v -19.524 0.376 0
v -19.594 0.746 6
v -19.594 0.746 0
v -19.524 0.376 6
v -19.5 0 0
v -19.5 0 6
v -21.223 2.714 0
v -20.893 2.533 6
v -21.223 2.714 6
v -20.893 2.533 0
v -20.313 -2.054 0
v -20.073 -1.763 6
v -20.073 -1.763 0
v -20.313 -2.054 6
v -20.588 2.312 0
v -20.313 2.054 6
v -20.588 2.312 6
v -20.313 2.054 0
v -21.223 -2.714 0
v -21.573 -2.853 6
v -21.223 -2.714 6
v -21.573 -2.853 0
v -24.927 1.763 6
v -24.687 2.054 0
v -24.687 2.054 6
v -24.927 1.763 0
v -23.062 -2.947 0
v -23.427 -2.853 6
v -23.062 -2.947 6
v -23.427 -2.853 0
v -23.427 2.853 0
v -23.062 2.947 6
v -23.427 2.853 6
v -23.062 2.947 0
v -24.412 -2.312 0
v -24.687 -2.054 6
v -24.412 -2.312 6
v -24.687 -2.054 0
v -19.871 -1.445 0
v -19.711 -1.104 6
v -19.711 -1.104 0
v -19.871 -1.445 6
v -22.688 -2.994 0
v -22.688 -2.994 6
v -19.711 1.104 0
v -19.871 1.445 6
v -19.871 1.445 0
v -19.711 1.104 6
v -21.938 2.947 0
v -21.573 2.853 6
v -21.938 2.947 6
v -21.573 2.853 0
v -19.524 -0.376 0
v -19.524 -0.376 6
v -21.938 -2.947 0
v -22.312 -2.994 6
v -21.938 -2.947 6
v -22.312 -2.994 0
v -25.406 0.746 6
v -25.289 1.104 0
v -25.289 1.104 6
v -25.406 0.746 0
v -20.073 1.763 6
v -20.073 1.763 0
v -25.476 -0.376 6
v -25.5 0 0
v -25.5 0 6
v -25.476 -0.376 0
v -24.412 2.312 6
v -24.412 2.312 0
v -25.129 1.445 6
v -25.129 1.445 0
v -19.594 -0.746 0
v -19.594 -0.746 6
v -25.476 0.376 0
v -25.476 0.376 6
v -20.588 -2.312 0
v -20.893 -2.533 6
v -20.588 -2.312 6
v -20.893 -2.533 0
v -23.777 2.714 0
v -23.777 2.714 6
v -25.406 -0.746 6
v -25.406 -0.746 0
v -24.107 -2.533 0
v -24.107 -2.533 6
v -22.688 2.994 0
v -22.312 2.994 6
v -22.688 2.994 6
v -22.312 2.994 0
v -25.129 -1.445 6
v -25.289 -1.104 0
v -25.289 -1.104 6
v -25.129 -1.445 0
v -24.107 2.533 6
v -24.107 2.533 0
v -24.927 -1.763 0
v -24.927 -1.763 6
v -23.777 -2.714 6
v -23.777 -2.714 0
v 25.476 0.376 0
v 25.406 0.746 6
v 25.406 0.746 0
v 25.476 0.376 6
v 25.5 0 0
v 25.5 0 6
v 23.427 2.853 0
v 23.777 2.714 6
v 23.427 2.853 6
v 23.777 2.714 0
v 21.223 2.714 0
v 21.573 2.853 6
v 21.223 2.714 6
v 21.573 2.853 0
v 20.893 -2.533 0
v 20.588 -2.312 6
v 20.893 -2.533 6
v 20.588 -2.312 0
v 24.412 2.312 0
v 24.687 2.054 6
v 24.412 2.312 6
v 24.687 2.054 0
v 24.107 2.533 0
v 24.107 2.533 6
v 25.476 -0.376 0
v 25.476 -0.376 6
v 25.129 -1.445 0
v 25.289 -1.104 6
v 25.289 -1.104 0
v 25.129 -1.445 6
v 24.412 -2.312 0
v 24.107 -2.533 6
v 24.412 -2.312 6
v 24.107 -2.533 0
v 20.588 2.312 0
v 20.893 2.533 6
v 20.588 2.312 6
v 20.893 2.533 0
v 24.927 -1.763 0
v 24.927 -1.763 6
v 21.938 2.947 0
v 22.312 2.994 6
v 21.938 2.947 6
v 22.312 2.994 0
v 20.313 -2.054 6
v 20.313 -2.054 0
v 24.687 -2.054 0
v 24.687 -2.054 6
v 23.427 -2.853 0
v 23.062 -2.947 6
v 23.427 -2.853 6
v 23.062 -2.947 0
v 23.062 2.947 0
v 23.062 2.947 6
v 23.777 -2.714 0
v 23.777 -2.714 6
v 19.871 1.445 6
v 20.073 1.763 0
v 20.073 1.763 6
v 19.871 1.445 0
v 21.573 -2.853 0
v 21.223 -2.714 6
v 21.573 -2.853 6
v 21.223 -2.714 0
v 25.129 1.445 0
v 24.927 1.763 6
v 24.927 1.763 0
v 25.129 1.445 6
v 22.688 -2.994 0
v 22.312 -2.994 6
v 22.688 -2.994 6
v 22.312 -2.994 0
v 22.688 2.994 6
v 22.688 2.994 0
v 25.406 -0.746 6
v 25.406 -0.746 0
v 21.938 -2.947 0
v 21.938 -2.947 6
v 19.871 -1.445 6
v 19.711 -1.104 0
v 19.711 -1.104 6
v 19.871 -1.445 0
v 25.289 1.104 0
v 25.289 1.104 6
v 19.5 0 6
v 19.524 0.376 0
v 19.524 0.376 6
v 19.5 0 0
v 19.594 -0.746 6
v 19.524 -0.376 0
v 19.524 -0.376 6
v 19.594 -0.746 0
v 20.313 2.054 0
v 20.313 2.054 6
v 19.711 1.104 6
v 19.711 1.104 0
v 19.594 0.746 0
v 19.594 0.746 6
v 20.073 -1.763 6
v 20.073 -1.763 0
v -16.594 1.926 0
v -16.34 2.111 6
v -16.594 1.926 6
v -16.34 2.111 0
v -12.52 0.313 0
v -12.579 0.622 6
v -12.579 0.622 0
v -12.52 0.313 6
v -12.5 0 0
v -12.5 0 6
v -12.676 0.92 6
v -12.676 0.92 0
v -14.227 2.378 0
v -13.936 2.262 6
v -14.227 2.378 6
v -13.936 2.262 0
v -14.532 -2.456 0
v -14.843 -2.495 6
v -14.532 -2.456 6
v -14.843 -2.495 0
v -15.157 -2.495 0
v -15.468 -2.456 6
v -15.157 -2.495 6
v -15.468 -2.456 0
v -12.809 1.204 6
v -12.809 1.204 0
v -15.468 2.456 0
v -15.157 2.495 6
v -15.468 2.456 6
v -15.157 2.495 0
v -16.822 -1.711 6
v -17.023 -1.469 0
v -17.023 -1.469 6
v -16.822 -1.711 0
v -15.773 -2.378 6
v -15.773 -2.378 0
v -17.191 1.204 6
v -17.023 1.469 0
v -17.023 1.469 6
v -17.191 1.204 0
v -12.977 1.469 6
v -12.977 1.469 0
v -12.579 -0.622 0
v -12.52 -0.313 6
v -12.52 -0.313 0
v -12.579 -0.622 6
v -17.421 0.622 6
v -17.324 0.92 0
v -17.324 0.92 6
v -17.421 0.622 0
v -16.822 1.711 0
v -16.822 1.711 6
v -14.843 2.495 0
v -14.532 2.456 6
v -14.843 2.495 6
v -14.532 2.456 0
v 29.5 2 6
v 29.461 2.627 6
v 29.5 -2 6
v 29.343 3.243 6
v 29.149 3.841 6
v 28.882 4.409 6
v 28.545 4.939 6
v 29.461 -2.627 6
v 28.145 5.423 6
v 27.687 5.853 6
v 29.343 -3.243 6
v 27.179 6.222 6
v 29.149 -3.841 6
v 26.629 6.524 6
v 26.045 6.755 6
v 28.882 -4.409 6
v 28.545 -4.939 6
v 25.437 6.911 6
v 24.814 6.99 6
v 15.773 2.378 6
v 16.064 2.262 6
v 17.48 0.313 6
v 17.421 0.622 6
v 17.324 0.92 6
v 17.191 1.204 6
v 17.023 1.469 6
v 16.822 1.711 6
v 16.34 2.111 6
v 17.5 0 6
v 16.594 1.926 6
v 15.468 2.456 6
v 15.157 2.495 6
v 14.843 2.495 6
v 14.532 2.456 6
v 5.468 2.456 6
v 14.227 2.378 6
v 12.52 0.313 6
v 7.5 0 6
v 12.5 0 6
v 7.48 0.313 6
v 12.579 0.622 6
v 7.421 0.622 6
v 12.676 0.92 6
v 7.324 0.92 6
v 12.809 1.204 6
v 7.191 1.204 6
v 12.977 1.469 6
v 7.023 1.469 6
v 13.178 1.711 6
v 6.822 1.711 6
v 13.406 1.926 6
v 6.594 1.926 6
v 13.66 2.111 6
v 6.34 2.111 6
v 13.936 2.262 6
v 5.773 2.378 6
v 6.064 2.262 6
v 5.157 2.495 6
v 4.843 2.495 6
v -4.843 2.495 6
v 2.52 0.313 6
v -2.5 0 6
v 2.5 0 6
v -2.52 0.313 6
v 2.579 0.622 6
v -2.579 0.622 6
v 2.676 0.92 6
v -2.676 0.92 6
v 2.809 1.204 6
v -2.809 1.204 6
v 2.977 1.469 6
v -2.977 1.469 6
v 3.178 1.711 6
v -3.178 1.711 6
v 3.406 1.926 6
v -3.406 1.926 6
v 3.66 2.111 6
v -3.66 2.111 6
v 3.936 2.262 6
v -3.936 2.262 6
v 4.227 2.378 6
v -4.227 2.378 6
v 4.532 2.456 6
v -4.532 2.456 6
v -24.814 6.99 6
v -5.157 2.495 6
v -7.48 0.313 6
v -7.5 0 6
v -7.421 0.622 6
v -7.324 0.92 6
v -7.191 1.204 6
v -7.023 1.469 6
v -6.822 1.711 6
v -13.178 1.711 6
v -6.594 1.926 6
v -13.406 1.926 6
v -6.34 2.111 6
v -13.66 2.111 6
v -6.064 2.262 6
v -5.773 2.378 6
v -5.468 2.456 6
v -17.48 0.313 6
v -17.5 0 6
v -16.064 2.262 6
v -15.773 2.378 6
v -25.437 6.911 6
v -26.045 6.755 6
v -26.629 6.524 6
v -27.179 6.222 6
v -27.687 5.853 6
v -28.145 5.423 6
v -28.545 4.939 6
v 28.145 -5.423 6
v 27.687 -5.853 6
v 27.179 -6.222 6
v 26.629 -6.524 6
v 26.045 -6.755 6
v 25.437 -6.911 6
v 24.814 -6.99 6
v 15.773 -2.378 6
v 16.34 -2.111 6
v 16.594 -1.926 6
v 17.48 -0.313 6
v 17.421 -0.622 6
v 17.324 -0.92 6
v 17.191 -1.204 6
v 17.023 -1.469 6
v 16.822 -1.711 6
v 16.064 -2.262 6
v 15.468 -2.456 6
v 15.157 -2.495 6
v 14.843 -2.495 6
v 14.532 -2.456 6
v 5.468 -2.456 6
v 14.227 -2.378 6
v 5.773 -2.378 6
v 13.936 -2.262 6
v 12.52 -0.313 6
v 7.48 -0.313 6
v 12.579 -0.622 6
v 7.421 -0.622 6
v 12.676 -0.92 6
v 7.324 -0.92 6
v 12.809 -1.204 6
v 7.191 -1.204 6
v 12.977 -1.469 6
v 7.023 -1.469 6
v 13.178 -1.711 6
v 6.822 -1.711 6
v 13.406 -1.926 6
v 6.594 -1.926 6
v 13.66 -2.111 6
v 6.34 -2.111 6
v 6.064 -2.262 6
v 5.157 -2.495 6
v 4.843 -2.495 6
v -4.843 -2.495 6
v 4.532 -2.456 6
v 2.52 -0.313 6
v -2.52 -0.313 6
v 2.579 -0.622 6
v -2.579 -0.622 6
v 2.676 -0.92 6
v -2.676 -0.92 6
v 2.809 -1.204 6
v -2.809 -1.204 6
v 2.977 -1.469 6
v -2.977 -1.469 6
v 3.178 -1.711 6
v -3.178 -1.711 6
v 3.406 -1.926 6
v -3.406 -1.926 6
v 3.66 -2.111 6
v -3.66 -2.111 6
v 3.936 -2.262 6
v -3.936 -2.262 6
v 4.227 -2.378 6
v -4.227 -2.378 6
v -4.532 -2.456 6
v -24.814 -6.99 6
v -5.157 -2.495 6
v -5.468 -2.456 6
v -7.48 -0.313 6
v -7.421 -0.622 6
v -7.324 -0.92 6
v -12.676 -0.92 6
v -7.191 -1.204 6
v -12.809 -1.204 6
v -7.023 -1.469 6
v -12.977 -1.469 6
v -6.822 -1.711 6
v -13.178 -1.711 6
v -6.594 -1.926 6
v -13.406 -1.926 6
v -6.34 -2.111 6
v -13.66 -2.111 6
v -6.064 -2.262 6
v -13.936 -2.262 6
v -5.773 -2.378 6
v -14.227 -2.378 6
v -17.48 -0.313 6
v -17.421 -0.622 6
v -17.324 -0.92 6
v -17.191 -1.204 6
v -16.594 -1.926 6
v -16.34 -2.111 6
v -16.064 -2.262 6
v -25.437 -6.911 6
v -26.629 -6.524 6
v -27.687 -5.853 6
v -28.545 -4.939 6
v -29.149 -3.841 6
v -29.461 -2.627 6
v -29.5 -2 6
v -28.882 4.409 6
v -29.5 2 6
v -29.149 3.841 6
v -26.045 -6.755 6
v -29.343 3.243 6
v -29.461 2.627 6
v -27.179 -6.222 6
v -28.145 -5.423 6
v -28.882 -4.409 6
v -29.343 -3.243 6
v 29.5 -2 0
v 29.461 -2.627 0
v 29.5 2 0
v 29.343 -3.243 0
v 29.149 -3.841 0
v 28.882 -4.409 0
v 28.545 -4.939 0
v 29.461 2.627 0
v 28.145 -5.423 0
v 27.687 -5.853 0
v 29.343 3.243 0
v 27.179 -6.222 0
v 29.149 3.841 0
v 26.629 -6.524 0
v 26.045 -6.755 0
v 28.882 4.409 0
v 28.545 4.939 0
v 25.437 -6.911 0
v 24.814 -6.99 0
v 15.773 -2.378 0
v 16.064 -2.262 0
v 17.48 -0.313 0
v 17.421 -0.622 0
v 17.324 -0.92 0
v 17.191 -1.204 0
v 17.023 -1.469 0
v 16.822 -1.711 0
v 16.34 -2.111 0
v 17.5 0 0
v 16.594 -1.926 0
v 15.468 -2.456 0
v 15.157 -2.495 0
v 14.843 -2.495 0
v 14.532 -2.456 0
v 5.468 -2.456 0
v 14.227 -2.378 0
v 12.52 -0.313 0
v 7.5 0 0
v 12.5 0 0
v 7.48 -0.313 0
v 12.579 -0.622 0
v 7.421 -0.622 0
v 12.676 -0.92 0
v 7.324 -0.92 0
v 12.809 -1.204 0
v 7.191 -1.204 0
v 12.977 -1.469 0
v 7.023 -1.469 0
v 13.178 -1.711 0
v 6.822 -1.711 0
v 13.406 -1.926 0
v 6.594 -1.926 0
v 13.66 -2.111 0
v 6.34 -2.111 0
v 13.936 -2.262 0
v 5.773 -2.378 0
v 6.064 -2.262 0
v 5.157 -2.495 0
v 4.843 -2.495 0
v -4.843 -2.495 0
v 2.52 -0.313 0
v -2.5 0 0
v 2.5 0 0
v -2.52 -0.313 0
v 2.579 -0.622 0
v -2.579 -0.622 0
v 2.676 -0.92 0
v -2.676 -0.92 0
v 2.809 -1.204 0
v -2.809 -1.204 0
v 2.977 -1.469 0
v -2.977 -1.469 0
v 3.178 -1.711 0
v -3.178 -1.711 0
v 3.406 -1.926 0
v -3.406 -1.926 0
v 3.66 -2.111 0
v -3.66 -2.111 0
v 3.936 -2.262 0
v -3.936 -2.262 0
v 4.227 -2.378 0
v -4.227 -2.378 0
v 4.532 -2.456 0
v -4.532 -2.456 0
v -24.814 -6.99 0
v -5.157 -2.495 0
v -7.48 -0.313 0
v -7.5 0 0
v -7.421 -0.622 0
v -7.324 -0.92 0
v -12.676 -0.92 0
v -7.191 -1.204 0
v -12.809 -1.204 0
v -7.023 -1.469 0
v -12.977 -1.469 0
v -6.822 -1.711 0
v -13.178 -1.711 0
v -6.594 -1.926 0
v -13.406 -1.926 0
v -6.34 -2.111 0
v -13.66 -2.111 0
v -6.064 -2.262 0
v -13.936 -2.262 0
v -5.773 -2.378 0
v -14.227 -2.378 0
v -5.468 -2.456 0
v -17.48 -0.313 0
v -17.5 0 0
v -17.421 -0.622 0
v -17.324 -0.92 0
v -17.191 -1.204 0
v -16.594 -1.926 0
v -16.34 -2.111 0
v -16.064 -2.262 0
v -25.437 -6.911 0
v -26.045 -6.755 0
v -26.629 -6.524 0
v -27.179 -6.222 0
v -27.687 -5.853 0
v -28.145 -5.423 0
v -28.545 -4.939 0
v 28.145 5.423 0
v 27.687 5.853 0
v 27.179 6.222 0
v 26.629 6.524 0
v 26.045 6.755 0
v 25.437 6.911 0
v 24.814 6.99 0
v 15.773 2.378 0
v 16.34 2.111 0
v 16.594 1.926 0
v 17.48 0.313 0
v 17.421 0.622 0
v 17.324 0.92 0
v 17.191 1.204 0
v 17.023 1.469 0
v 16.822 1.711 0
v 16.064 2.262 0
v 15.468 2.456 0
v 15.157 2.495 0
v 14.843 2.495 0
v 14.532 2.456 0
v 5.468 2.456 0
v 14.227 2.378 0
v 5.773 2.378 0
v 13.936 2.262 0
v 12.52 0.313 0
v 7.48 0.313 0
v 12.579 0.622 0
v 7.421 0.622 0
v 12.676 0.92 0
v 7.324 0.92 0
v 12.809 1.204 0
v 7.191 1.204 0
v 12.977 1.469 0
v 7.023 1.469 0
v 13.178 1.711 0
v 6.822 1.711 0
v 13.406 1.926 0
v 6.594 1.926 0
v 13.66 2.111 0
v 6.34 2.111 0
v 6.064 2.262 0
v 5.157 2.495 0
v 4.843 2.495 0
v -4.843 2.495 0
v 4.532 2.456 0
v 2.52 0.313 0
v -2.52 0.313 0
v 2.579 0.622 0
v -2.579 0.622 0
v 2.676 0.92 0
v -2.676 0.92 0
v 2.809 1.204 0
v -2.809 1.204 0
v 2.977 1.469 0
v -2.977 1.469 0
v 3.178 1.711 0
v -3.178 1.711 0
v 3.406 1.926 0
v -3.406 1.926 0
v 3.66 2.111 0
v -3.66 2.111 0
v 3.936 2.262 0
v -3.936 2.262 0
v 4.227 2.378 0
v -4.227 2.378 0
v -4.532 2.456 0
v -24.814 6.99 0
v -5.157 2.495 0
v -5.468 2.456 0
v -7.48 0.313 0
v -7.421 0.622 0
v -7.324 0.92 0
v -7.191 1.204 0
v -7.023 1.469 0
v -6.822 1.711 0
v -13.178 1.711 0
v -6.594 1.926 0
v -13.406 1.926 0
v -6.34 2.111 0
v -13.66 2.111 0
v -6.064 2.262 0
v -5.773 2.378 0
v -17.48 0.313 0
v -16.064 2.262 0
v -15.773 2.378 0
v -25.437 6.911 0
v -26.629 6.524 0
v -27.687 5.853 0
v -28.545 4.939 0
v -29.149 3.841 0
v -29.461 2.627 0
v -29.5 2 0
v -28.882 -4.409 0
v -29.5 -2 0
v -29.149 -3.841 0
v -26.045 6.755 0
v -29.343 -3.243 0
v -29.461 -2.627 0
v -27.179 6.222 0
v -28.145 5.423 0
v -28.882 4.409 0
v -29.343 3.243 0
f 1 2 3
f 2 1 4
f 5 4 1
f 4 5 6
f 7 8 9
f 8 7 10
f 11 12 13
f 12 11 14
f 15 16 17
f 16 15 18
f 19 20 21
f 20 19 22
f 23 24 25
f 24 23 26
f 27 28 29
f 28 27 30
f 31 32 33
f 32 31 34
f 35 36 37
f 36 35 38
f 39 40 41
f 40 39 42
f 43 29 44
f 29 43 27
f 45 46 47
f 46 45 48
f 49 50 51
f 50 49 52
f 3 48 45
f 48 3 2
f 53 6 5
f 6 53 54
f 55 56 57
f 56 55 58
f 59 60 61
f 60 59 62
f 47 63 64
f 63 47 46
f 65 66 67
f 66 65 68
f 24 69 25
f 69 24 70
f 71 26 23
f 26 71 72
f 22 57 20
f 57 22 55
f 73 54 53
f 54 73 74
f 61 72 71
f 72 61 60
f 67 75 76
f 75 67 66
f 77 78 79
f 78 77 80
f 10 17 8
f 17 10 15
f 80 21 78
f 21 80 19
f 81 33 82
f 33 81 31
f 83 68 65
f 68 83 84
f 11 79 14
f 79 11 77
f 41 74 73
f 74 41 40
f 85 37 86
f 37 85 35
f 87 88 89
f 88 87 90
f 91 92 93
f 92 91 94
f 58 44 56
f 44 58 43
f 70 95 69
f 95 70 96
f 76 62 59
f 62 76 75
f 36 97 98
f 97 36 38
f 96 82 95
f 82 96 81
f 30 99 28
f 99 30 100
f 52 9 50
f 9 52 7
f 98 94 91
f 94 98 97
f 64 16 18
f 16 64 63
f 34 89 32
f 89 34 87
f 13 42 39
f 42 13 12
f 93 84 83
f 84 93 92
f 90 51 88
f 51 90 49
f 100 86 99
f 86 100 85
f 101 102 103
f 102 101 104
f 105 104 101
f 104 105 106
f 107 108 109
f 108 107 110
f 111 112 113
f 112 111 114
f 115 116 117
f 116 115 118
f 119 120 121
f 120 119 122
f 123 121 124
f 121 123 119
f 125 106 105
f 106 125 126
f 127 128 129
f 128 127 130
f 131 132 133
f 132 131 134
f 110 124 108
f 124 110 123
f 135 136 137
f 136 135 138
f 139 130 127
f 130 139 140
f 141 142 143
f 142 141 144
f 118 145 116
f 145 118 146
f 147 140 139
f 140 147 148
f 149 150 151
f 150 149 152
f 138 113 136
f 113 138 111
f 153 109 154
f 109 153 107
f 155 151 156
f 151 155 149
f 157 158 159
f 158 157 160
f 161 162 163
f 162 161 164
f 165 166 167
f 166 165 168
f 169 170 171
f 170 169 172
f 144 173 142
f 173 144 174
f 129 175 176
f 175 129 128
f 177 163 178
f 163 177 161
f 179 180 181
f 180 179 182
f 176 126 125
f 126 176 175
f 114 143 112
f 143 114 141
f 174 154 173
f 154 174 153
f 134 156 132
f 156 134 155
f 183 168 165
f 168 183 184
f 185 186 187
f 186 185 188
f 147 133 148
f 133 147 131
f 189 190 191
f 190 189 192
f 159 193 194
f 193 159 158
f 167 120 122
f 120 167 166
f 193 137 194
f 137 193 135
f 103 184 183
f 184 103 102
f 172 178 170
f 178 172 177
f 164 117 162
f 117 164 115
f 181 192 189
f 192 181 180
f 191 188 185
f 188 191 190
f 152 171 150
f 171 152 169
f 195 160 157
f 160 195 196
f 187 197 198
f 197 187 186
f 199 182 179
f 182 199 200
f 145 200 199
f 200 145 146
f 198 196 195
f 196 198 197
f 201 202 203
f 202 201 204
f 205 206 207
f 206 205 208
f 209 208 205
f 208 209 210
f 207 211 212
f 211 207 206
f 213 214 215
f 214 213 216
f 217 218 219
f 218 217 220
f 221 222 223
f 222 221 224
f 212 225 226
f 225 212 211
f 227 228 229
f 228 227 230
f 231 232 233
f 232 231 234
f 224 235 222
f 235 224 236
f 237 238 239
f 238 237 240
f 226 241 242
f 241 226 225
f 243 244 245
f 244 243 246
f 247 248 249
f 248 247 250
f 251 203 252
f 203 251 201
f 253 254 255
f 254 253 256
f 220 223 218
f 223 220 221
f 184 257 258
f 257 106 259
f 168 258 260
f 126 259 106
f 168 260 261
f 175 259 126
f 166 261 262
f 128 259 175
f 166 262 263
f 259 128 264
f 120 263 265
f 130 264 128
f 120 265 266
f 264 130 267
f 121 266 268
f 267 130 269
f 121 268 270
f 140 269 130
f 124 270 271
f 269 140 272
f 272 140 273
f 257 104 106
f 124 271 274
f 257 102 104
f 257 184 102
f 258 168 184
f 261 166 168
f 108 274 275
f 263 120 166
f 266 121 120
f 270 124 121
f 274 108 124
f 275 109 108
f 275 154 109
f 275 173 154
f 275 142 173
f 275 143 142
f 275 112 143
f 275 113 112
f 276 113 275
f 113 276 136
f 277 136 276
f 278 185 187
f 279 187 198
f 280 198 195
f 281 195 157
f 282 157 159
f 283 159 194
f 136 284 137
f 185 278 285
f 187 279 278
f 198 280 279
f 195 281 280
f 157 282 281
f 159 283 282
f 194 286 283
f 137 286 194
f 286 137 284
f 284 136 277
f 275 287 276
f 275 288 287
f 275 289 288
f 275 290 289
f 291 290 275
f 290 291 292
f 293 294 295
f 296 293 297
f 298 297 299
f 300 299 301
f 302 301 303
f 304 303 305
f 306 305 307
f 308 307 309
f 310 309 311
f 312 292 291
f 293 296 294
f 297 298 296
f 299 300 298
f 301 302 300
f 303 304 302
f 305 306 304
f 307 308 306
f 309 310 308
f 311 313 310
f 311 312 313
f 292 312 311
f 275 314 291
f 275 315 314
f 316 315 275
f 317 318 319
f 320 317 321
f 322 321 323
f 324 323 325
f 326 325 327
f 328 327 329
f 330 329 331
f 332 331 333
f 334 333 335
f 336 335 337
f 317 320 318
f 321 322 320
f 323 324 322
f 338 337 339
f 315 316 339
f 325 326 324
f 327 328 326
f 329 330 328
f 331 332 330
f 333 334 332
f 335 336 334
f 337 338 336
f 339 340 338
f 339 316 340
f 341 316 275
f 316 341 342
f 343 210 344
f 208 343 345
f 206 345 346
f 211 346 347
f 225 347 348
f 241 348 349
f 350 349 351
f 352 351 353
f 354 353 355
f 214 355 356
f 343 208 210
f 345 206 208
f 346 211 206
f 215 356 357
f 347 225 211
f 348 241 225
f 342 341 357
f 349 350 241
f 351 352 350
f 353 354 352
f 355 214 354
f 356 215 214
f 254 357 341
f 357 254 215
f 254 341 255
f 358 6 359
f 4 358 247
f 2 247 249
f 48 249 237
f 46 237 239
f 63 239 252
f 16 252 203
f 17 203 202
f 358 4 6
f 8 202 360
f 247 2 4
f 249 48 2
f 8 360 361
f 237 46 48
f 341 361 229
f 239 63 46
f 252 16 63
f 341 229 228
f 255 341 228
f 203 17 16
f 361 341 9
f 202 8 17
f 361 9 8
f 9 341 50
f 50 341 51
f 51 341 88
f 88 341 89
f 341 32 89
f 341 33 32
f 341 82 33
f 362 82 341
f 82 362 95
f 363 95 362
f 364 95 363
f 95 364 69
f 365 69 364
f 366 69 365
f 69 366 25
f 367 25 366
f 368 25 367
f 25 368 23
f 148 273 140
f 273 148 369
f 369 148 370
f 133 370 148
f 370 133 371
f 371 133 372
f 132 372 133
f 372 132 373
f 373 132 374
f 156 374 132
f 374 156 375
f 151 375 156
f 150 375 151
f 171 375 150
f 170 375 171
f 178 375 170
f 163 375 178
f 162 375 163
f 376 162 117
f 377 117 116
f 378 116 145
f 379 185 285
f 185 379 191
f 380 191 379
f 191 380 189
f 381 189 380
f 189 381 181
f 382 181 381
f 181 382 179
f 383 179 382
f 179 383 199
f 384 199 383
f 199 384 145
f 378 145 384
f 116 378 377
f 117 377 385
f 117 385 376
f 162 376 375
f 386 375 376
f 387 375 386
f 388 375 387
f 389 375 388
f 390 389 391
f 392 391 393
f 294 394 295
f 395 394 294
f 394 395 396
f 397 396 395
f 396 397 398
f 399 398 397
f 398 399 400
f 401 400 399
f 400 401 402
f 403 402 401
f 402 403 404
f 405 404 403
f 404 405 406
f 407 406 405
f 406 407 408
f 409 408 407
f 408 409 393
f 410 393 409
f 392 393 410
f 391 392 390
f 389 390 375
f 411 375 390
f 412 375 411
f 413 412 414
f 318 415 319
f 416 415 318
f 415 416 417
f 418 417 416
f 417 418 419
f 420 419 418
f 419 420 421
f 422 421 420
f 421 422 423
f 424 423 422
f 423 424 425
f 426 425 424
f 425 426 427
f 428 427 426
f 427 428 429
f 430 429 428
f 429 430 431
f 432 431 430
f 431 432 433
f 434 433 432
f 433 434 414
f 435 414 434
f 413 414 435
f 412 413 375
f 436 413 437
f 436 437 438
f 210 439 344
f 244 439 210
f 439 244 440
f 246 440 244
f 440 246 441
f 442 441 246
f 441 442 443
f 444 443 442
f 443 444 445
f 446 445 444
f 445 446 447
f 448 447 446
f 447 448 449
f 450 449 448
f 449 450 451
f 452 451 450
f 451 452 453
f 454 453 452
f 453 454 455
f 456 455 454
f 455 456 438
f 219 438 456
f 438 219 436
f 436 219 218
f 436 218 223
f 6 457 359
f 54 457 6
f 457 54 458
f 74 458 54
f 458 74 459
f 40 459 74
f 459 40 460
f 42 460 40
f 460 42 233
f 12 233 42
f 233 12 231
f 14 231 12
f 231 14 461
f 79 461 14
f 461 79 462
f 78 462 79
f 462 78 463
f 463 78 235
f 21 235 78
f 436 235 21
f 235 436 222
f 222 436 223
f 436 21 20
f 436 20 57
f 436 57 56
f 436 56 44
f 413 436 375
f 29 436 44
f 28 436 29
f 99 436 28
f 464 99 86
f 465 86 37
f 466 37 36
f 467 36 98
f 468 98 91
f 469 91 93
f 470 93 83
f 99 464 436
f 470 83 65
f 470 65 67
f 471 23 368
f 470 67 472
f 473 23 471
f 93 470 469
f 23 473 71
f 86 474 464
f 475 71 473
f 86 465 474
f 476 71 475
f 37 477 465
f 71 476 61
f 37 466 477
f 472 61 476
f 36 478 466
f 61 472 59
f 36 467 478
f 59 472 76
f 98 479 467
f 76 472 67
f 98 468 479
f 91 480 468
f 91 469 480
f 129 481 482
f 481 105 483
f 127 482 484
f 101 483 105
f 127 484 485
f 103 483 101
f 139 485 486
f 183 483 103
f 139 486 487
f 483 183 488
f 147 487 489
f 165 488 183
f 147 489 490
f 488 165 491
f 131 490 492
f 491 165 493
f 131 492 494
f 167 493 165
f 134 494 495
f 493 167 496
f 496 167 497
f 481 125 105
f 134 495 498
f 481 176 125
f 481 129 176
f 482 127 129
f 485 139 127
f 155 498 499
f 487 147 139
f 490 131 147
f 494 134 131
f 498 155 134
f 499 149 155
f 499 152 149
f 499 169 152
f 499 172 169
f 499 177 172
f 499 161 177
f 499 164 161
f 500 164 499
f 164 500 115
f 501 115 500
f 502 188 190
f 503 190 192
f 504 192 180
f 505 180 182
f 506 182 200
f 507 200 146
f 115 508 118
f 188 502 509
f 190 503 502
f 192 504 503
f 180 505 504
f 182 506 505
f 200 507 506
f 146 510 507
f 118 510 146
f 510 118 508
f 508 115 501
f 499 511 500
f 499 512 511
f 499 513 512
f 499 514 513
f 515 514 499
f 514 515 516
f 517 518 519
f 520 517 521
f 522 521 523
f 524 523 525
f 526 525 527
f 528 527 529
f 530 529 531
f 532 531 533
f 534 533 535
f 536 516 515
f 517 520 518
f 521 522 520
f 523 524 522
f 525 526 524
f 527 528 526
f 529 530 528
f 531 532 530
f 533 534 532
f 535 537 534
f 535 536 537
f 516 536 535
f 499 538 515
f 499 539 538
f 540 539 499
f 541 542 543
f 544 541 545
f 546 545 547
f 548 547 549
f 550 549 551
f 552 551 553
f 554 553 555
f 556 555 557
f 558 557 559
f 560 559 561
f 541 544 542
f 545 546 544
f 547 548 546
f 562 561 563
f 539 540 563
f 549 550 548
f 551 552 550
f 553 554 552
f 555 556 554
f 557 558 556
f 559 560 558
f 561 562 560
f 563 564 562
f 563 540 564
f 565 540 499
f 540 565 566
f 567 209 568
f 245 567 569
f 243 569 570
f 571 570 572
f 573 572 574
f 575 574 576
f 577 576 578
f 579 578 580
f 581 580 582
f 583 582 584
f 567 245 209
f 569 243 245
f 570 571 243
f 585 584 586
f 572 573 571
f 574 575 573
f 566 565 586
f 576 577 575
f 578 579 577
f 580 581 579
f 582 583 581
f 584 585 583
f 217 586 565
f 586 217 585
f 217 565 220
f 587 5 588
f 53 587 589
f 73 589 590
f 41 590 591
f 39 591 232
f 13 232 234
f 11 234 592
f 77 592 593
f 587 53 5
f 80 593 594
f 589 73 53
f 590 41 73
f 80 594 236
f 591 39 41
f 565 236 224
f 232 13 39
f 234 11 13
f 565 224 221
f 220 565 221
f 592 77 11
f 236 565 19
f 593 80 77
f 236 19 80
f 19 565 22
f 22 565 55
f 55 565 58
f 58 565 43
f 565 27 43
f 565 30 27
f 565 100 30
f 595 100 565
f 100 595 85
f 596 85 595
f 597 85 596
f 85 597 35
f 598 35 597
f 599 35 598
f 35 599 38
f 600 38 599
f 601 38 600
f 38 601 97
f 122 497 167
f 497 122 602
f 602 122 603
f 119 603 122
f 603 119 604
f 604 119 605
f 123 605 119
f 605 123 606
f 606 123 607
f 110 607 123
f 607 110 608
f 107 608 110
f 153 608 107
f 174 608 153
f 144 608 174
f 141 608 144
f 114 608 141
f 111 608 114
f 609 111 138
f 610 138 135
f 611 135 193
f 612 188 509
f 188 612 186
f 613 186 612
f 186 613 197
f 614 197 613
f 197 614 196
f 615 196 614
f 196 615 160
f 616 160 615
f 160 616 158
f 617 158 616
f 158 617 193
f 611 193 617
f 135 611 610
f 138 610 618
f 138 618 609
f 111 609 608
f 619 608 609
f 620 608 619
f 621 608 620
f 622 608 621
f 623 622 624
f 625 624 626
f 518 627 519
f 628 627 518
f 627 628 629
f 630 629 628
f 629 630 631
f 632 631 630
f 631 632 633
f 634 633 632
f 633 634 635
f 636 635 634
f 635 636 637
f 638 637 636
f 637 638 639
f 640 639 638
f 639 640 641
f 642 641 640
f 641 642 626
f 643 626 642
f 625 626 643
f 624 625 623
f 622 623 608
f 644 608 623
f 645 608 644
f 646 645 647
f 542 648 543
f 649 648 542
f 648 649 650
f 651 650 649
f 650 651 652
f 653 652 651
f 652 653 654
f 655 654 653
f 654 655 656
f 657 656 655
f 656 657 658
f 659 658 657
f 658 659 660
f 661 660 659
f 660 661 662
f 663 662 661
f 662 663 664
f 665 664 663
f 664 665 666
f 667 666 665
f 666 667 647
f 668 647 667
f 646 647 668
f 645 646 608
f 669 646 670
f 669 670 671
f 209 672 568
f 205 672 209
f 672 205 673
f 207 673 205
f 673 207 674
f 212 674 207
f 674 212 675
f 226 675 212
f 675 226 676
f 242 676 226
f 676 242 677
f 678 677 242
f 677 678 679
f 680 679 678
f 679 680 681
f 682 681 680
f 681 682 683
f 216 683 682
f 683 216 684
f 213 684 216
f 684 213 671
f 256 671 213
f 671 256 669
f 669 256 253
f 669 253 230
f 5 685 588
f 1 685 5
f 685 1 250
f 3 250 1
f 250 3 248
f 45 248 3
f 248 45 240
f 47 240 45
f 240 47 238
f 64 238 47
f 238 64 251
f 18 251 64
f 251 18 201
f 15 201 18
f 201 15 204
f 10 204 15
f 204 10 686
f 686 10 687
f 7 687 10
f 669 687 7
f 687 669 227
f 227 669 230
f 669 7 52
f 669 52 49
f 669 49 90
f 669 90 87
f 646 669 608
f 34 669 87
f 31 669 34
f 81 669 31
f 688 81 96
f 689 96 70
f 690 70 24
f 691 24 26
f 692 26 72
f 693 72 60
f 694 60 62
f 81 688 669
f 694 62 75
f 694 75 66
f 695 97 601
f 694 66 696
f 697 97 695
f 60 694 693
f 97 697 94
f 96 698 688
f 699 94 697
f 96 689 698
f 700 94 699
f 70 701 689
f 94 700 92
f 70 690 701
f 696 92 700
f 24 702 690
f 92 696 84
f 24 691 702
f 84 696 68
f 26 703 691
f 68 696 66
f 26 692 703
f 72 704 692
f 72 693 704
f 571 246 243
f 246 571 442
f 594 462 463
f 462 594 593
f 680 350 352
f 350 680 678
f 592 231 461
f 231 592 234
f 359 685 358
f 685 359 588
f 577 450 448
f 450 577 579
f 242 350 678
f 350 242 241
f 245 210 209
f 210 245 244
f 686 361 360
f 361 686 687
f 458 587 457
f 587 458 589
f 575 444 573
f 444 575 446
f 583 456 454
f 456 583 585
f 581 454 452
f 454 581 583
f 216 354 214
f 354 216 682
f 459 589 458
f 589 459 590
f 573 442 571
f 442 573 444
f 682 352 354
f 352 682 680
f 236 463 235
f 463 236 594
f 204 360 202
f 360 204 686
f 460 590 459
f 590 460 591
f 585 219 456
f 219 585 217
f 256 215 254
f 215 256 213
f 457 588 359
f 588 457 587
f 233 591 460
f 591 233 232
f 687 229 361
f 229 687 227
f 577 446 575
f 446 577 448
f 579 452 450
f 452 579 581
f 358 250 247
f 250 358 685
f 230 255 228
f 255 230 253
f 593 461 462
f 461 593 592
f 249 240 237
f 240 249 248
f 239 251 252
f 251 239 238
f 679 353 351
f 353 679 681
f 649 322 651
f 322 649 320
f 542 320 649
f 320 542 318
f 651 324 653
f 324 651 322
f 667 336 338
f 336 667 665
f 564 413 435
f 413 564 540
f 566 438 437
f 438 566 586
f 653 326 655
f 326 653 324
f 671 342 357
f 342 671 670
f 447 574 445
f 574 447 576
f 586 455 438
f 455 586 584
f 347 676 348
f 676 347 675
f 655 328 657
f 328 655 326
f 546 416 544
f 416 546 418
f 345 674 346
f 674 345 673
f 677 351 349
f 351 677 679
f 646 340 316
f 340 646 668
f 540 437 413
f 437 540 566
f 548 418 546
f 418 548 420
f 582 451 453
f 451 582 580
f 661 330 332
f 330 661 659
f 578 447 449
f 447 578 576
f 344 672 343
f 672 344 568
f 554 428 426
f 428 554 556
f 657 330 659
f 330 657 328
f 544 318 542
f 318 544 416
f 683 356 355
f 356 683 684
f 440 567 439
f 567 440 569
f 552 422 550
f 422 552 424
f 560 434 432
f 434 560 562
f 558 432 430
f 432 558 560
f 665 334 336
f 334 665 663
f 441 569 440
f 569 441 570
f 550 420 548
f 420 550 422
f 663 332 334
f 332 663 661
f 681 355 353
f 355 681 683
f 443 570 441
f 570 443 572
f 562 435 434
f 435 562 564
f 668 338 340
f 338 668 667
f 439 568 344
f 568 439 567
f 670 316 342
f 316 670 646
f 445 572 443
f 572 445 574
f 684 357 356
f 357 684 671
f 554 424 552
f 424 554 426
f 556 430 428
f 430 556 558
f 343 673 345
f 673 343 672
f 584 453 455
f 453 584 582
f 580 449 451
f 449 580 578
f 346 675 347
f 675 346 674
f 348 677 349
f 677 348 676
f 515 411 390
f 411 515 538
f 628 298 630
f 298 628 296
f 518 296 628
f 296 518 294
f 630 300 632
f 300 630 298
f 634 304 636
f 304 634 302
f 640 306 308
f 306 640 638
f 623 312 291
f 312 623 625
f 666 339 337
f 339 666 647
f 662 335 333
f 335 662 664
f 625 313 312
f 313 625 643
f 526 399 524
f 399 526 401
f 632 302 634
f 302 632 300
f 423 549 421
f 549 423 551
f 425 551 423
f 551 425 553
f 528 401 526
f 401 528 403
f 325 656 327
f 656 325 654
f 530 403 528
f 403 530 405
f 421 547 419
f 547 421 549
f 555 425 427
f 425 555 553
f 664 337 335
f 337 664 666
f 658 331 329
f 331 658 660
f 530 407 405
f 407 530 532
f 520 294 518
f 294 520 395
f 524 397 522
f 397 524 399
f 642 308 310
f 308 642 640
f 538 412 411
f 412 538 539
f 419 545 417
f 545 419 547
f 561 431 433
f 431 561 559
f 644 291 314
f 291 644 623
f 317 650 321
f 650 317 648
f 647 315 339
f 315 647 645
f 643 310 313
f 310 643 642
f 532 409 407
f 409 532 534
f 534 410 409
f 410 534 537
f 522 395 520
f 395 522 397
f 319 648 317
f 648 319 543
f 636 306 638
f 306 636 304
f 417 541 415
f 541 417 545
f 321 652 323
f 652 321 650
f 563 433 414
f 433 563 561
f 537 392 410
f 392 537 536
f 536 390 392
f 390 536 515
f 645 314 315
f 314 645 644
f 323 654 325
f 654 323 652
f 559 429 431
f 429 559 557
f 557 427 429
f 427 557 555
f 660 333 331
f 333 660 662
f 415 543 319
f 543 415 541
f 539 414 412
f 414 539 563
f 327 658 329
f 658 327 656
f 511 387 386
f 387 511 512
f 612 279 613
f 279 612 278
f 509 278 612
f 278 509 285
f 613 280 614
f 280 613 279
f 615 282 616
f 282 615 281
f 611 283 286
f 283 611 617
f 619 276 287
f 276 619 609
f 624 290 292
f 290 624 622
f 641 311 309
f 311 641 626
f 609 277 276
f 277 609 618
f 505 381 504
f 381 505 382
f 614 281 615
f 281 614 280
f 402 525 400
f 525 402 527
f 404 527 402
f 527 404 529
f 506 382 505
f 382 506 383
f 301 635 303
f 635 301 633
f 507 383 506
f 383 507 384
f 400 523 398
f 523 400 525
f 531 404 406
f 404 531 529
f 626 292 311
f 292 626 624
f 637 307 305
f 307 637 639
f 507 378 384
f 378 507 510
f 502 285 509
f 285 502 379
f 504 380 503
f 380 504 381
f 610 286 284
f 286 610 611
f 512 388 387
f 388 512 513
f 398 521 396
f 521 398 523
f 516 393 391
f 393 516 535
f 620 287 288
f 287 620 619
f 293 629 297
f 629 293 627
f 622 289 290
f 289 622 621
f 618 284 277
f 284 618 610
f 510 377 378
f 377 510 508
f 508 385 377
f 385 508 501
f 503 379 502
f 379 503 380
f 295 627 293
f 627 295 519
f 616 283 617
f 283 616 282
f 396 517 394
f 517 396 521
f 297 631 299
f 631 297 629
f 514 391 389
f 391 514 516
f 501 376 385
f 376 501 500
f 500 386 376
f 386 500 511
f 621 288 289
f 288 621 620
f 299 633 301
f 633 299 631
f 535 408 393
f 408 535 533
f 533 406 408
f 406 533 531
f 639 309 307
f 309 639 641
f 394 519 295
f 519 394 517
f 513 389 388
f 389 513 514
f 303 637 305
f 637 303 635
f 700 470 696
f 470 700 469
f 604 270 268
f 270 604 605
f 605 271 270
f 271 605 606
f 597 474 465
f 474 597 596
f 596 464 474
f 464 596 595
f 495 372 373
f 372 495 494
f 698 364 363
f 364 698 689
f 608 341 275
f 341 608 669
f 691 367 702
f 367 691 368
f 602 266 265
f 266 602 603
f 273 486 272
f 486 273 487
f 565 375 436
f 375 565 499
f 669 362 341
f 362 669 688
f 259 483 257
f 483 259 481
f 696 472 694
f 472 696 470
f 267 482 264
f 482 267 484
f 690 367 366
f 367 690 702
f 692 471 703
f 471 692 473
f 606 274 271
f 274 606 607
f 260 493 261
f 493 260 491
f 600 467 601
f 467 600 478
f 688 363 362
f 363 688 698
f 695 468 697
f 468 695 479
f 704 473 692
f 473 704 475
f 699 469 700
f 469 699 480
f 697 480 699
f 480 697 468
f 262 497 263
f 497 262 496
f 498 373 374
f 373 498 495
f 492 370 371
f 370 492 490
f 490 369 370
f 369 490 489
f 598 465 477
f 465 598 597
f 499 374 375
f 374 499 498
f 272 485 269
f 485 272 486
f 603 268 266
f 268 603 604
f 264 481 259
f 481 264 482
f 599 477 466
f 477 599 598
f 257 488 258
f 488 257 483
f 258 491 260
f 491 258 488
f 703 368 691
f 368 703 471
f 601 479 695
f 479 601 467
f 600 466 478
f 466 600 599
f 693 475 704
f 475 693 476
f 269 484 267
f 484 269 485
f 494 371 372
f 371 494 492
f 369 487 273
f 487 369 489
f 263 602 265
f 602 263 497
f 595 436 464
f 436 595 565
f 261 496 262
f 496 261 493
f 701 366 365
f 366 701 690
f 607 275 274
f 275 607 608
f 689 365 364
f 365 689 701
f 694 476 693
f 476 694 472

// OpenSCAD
$fn = 50;


difference() {
	union() {
		hull() {
			translate(v = [-24.5000000000, 2.0000000000, 0]) {
				cylinder(h = 6, r = 5);
			}
			translate(v = [24.5000000000, 2.0000000000, 0]) {
				cylinder(h = 6, r = 5);
			}
			translate(v = [-24.5000000000, -2.0000000000, 0]) {
				cylinder(h = 6, r = 5);
			}
			translate(v = [24.5000000000, -2.0000000000, 0]) {
				cylinder(h = 6, r = 5);
			}
		}
	}
	union() {
		#translate(v = [-22.5000000000, 0.0000000000, 0]) {
			cylinder(h = 6, r = 3.0000000000);
		}
		#translate(v = [22.5000000000, 0.0000000000, 0]) {
			cylinder(h = 6, r = 3.0000000000);
		}
		#translate(v = [-22.5000000000, 0.0000000000, -100.0000000000]) {
			cylinder(h = 200, r = 3.0000000000);
		}
		#translate(v = [-22.5000000000, 0.0000000000, -100.0000000000]) {
			cylinder(h = 200, r = 3.0000000000);
		}
		#translate(v = [22.5000000000, 0.0000000000, -100.0000000000]) {
			cylinder(h = 200, r = 3.0000000000);
		}
		#translate(v = [22.5000000000, 0.0000000000, -100.0000000000]) {
			cylinder(h = 200, r = 3.0000000000);
		}
		#translate(v = [-22.5000000000, 0.0000000000, 0]) {
			cylinder(h = 6, r = 1.5000000000);
		}
		#translate(v = [22.5000000000, 0.0000000000, 0]) {
			cylinder(h = 6, r = 1.5000000000);
		}
		#translate(v = [-22.5000000000, 0.0000000000, 0]) {
			cylinder(h = 6, r = 1.5000000000);
		}
		#translate(v = [22.5000000000, 0.0000000000, 0]) {
			cylinder(h = 6, r = 1.5000000000);
		}
		#translate(v = [-22.5000000000, 0.0000000000, 0]) {
			cylinder(h = 6, r = 1.5000000000);
		}
		#translate(v = [22.5000000000, 0.0000000000, 0]) {
			cylinder(h = 6, r = 1.5000000000);
		}
		#translate(v = [-15.0000000000, 0, 0]) {
			cylinder(h = 6, r = 2.5000000000);
		}
		#translate(v = [-5.0000000000, 0, 0]) {
			cylinder(h = 6, r = 2.5000000000);
		}
		#translate(v = [5.0000000000, 0, 0]) {
			cylinder(h = 6, r = 2.5000000000);
		}
		#translate(v = [15.0000000000, 0, 0]) {
			cylinder(h = 6, r = 2.5000000000);
		}
	}
}
